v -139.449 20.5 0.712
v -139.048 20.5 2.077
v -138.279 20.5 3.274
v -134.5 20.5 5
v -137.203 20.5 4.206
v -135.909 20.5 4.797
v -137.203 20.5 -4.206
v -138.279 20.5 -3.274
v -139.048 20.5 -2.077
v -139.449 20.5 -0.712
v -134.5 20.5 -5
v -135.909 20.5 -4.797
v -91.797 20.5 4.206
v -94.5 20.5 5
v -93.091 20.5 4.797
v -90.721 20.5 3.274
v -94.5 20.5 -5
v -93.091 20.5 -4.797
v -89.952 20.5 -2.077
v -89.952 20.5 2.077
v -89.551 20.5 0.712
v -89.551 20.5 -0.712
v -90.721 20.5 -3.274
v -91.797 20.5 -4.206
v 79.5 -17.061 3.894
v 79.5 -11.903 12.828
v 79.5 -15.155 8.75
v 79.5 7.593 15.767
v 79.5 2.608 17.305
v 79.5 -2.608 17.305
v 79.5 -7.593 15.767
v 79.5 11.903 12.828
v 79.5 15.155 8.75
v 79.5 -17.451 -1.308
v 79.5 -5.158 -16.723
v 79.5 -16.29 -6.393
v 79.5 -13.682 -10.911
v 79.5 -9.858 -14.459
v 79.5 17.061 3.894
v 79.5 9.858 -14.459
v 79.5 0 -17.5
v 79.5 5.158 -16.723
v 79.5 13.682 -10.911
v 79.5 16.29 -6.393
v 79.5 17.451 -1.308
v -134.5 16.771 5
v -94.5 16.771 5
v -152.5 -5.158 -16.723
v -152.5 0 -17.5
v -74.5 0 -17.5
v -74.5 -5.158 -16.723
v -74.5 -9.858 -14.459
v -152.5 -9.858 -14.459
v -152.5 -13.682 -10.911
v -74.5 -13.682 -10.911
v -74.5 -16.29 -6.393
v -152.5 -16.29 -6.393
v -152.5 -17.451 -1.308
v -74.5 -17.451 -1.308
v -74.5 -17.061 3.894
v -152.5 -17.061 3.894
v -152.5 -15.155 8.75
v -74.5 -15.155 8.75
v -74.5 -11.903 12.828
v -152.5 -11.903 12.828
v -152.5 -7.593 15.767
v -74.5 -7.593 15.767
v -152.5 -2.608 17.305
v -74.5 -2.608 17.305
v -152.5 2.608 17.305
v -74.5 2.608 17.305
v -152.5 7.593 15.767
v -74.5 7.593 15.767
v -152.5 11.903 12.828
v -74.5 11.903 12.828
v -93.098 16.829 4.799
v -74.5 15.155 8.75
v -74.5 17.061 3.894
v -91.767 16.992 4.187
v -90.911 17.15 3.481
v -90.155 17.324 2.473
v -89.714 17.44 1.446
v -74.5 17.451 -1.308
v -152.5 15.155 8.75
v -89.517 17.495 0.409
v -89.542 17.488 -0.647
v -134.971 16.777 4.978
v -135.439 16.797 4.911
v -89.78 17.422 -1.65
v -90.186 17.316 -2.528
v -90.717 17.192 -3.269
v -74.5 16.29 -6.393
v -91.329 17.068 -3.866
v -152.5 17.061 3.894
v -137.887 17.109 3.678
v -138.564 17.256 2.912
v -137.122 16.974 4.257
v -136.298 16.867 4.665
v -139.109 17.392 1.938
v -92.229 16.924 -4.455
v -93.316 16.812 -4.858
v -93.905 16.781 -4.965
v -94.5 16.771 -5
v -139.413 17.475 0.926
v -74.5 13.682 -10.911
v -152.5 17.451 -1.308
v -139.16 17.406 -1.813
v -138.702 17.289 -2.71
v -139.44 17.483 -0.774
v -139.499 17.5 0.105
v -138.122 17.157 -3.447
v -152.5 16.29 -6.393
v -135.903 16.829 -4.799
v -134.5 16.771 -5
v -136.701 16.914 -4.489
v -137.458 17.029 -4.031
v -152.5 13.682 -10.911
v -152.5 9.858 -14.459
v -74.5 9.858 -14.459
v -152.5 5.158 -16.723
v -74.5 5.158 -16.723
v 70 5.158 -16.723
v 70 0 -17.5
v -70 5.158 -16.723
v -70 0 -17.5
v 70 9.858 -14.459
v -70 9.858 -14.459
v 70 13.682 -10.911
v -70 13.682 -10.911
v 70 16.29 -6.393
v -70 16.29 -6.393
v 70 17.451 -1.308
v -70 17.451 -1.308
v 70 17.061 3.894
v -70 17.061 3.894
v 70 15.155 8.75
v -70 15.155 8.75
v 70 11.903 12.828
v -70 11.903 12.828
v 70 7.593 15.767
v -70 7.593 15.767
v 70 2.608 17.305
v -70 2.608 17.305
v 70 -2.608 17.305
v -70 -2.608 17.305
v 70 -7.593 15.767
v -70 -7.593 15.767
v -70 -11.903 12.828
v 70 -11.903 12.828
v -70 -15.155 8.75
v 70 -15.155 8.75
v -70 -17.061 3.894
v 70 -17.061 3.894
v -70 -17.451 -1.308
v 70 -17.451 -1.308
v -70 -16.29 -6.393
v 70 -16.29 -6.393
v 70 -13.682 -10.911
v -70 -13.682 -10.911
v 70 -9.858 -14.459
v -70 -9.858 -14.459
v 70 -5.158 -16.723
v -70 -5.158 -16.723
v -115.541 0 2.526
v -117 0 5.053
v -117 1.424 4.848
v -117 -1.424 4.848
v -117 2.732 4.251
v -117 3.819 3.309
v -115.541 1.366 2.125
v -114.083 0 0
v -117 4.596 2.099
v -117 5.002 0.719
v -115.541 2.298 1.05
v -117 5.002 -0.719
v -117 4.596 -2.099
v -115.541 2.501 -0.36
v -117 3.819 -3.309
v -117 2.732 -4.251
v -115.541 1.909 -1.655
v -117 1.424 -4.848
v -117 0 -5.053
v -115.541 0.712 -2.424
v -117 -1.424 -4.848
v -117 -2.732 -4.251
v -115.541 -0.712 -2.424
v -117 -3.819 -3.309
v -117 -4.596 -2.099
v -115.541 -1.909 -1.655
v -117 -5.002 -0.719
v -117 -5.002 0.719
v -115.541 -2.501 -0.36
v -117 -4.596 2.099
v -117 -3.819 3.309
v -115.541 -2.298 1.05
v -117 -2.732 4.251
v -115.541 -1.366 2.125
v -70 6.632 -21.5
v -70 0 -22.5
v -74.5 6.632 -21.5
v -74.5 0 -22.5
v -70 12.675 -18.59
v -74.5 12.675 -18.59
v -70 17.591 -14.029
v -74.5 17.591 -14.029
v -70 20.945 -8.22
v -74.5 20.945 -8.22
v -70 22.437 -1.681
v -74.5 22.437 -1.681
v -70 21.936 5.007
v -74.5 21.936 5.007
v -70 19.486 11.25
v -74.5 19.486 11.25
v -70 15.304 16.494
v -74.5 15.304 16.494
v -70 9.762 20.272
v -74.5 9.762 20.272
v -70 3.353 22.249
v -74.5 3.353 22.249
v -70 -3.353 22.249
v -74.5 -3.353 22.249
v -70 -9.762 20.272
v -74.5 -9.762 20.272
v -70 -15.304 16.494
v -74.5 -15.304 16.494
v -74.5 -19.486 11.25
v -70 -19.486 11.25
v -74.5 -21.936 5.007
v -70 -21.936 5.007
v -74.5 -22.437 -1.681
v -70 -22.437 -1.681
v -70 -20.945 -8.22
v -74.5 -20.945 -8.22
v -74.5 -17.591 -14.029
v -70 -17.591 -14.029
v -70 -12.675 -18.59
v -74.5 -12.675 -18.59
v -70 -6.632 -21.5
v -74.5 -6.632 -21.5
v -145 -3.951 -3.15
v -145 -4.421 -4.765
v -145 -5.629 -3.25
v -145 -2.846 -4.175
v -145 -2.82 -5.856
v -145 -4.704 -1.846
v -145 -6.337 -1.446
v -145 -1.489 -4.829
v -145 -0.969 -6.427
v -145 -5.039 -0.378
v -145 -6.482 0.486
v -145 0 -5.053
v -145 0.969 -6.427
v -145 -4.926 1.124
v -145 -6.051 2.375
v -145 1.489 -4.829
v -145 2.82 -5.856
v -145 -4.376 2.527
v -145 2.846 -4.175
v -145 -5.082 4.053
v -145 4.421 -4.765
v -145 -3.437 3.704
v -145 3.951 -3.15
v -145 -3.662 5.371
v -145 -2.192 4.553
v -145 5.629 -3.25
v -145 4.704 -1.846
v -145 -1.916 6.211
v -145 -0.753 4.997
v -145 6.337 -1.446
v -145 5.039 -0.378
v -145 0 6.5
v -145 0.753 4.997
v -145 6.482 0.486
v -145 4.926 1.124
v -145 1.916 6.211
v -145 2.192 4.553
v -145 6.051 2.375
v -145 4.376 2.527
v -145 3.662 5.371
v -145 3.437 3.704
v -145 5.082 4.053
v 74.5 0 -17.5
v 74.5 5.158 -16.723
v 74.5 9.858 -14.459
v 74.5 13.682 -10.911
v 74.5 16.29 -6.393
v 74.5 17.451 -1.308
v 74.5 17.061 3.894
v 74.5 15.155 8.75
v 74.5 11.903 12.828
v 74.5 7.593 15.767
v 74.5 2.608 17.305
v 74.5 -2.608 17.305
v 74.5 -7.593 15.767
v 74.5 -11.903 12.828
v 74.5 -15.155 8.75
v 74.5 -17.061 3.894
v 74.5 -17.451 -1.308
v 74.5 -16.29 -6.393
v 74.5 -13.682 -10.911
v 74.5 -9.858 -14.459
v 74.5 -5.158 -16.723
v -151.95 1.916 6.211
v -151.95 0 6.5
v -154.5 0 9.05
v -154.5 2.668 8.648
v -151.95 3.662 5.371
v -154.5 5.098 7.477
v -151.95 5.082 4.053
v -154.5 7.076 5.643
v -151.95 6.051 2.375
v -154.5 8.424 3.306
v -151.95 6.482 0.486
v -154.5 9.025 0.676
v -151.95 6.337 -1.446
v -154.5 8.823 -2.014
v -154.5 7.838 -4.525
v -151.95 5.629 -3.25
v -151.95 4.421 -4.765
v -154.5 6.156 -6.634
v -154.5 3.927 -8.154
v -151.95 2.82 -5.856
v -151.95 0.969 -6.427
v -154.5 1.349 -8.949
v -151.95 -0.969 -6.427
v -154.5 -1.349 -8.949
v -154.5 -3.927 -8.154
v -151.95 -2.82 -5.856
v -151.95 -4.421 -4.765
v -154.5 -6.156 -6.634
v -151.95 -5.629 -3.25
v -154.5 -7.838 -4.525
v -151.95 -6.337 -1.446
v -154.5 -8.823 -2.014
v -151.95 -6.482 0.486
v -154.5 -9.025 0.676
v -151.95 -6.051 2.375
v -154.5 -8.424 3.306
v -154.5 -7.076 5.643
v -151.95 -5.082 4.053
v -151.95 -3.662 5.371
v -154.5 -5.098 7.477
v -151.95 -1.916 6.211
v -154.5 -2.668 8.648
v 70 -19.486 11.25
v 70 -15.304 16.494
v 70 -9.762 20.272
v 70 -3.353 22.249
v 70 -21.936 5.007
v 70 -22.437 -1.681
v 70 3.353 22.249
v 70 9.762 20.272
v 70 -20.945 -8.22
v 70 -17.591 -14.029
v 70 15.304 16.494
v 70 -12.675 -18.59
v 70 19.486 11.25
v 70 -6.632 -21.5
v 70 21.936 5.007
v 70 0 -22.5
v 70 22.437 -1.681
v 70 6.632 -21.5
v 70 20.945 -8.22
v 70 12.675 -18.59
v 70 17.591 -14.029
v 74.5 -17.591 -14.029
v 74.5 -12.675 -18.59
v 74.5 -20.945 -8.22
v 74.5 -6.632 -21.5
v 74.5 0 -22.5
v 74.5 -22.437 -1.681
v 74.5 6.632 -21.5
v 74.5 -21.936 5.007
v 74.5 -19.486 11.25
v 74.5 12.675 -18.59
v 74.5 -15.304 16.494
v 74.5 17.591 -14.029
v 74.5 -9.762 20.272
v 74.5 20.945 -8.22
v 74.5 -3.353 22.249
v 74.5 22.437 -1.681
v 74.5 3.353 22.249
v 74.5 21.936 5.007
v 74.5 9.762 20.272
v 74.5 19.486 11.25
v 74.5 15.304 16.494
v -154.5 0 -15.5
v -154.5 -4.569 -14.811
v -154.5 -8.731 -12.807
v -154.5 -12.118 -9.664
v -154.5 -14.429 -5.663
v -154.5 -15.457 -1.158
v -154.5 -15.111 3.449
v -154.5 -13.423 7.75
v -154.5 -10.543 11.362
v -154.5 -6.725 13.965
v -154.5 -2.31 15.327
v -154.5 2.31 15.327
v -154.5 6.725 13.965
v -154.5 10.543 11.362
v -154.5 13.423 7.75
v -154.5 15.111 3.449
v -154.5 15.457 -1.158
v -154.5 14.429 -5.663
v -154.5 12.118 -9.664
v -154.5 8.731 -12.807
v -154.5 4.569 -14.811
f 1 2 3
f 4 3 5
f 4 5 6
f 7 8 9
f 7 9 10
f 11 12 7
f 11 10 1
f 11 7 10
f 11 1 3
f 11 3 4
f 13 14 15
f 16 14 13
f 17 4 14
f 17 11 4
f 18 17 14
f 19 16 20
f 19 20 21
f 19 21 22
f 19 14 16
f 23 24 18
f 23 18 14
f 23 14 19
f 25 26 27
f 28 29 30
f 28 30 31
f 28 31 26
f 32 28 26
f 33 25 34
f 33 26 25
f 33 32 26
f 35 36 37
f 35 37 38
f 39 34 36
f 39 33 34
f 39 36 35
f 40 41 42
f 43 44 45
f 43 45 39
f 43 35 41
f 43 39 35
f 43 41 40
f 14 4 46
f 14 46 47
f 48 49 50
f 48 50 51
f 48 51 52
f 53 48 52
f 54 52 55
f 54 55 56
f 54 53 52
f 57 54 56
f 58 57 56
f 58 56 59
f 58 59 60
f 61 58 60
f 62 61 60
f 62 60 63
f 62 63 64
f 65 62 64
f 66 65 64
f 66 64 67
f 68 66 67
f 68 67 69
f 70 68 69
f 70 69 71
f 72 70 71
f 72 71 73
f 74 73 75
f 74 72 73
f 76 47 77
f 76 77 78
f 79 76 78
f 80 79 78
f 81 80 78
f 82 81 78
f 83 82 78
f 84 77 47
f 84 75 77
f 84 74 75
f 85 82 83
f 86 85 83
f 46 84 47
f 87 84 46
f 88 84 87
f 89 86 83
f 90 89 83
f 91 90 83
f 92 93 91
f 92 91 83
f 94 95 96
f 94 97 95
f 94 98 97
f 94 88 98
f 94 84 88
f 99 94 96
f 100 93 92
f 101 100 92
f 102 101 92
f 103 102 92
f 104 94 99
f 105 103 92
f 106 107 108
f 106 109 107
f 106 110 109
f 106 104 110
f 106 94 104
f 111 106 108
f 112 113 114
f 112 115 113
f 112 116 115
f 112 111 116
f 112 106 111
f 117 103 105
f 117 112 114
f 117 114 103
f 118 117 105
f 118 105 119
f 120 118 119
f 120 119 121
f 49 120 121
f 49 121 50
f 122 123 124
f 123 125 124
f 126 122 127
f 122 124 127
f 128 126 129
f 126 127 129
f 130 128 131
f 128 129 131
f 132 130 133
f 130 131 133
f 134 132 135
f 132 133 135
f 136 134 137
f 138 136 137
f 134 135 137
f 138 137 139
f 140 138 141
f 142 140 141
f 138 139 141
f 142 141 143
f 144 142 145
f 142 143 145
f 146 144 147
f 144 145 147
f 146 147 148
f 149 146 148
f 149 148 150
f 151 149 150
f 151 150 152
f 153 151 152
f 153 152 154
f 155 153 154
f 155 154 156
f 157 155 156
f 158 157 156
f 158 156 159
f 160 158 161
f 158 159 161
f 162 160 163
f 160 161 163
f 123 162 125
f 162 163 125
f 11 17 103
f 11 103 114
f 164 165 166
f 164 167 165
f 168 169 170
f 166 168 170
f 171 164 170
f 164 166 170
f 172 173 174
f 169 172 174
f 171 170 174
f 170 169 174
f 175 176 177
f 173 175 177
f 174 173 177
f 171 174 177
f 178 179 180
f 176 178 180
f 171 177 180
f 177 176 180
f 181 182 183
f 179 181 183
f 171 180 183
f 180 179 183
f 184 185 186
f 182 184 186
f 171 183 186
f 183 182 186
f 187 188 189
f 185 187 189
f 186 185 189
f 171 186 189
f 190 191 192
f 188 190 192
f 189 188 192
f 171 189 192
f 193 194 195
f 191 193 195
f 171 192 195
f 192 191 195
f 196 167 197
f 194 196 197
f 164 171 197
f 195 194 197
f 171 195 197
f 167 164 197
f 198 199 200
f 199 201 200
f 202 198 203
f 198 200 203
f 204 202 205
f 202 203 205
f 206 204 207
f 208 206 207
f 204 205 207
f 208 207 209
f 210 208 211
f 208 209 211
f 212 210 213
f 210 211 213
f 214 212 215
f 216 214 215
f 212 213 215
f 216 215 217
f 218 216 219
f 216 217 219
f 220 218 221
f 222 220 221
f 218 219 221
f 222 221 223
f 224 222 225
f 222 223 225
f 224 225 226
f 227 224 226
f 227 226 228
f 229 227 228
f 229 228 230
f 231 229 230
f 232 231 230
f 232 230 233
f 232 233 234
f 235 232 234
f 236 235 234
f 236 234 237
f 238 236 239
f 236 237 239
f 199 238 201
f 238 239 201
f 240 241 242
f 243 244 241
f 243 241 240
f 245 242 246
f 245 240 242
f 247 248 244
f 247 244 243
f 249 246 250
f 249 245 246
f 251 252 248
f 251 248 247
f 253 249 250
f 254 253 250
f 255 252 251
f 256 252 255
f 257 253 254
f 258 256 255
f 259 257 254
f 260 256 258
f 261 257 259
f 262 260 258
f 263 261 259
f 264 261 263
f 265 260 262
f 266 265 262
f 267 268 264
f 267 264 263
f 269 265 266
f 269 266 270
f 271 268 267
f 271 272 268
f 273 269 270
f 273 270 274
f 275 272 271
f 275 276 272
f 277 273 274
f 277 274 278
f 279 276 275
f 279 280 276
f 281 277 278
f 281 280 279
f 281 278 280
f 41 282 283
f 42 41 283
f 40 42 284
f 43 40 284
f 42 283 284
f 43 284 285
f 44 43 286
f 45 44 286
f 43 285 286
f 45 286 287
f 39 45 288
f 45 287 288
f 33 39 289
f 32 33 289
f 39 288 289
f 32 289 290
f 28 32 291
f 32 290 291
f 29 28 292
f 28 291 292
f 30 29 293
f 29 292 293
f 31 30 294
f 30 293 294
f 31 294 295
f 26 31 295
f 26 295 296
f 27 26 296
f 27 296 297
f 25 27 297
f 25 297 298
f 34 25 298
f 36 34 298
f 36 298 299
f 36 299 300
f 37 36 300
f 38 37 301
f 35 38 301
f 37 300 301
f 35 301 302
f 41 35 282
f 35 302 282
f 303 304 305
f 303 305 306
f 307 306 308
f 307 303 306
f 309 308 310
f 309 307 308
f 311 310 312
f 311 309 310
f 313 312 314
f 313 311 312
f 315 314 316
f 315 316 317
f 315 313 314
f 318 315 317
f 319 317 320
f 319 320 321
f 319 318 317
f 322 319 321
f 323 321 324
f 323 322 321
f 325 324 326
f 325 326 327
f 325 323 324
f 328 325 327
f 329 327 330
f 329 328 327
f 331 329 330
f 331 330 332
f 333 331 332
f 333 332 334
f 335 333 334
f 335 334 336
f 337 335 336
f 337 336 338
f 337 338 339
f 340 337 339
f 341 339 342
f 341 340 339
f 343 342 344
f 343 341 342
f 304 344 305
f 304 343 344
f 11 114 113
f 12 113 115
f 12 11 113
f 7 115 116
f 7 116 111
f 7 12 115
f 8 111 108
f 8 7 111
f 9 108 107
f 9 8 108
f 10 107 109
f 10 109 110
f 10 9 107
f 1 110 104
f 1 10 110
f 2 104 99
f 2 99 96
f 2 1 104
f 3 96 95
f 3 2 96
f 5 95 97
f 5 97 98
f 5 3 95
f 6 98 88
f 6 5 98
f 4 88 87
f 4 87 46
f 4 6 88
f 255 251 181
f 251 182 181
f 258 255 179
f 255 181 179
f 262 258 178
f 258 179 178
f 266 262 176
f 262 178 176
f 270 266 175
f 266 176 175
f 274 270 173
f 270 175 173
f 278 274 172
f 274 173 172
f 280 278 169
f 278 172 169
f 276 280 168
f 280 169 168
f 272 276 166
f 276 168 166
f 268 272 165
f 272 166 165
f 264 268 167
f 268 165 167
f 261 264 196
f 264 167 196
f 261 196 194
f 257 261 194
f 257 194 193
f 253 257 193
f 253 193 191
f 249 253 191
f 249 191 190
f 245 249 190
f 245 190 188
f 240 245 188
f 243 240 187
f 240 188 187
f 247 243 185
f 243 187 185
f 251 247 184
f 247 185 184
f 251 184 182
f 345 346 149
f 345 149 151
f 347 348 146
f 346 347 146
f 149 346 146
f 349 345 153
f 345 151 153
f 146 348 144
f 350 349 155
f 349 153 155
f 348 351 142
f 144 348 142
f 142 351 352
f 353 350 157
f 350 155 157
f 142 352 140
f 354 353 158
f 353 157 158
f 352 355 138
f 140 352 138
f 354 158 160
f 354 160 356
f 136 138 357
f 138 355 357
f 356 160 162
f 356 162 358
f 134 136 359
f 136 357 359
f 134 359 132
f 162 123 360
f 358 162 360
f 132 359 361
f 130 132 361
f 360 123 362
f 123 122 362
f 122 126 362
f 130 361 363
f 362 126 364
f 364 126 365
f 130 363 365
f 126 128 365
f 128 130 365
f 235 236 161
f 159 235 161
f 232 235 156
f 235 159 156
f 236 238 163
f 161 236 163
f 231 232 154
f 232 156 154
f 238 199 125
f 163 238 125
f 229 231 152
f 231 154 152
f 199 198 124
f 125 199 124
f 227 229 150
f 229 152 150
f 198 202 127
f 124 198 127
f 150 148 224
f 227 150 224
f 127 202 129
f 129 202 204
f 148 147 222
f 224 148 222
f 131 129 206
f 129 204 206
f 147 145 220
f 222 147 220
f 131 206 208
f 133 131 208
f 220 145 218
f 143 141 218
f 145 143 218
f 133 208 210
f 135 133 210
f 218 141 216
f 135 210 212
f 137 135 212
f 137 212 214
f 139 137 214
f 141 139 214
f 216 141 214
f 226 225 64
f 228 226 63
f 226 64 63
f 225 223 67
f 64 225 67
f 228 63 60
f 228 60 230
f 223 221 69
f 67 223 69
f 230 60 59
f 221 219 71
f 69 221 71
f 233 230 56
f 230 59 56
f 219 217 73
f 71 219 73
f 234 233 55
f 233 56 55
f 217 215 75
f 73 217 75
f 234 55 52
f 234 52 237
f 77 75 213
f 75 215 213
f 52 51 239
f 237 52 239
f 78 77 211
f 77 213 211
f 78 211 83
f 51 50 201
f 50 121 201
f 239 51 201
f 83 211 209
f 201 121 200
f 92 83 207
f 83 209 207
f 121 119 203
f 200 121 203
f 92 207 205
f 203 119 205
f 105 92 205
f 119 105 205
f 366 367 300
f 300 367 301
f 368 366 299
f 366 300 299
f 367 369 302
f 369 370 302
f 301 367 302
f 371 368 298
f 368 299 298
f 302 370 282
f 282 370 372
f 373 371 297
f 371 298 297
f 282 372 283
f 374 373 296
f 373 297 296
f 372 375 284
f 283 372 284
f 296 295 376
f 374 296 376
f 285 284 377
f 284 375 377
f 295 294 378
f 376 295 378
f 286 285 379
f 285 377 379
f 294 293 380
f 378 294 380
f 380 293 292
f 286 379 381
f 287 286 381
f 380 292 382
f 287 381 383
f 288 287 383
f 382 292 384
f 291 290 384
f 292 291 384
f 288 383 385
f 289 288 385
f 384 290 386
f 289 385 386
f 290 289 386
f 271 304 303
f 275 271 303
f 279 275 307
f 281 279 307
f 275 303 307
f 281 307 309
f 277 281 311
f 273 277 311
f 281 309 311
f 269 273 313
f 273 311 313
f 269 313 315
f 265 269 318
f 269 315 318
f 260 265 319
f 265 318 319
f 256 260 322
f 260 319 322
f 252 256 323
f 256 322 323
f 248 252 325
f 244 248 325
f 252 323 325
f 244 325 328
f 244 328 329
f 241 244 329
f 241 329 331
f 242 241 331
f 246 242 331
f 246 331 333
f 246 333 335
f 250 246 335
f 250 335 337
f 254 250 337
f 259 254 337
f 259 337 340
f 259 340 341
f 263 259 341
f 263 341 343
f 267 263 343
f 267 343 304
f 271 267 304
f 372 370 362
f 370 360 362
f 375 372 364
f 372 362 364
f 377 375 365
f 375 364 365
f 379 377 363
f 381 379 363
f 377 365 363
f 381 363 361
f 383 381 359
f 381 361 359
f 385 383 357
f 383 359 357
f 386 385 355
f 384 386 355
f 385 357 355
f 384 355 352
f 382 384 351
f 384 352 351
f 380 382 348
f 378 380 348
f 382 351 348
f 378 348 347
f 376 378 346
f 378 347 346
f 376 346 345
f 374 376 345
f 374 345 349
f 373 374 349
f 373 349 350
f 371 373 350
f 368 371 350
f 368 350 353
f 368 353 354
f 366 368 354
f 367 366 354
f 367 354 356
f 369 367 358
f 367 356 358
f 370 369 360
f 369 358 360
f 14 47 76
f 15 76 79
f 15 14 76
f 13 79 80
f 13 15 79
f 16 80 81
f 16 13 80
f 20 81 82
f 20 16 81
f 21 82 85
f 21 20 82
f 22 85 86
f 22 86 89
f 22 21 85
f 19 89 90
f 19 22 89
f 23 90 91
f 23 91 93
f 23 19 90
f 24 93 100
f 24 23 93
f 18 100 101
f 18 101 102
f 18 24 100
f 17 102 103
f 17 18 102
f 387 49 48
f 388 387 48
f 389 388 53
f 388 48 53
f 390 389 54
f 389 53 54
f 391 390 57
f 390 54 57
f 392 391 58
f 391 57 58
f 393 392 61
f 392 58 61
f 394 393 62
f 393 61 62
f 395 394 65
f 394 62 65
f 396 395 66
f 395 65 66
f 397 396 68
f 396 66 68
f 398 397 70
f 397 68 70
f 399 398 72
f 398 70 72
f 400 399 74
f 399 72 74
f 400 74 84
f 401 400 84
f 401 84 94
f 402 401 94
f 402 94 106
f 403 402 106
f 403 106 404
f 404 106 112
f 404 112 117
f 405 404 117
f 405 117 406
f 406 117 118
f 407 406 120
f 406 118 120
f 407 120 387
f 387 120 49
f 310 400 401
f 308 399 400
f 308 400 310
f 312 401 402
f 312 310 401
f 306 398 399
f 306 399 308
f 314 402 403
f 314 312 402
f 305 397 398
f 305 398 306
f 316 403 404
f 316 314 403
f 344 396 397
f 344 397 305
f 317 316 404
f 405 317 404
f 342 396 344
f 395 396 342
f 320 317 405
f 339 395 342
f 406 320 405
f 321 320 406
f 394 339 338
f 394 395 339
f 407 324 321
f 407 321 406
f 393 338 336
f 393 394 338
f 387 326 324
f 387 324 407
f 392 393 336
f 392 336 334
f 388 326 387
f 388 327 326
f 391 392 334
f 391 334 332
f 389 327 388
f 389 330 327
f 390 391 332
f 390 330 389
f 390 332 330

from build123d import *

# Parameters (mm, degrees)
BOSS_EXTRUDE1_START      = 80
SKETCH2_R                = 17.5
BOSS_EXTRUDE1_DEPTH      = 80
BOSS_EXTRUDE2_REACH      = 163.943
BOSS_EXTRUDE2_END_RADIUS = 17.5
SKETCH4_R                = 17.5
BOSS_EXTRUDE3_DEPTH      = 5
HOLE1_D                  = 10.106
HOLE1_DEPTH              = 37.5
HOLE1_CBORE_D            = 13
HOLE1_CBORE_DEPTH        = 9.5
HOLE1_TIP                = 2.91735091
CHAMFER1_SIZE            = 2.55
CHAMFER2_SIZE            = 2


with BuildPart() as part:
    # Sketch1 → Revolve1 (revolve)
    with BuildSketch(Plane.XY, mode=Mode.PRIVATE) as revolve1_sk:
        Polygon((-74.5, 22.5), (-74.5, 0), (74.5, 0), (74.5, 22.5), (70, 22.5), (70, 17.5), (-70, 17.5), (-70, 22.5), align=None)
    revolve(revolve1_sk.sketch.rotate(Axis((-74.5, 0, 0), (1, 0, 0)), 270), axis=Axis((-74.5, 0, 0), (1, 0, 0)))

    # Sketch2 → Boss-Extrude1 (add)
    with BuildSketch(Plane.ZY.offset(74.5).offset(BOSS_EXTRUDE1_START)):
        with Locations(Location((0, 0, 0), (0, 0, 180))):
            Circle(SKETCH2_R)
    extrude(amount=-BOSS_EXTRUDE1_DEPTH)

    # Boss-Extrude2: up to this cylinder (the profile starts outside it)
    boss_extrude2_end = Plane(origin=(-114.5, 0, 0), z_dir=(1, 0, 0)) * Cylinder(BOSS_EXTRUDE2_END_RADIUS, 363.886, mode=Mode.PRIVATE)
    # Sketch3 → Boss-Extrude2 (add, up to the surface)
    with BuildSketch(Plane(origin=(0, 20.5, 0), x_dir=(1, 0, 0), z_dir=(0, 1, 0)), mode=Mode.PRIVATE) as boss_extrude2_sk1:
        with BuildLine():
            Line((-134.5, -5), (-94.5, -5))
            ThreePointArc((-94.5, -5), (-89.5, 0), (-94.5, 5))
            Line((-94.5, 5), (-134.5, 5))
            ThreePointArc((-134.5, 5), (-139.5, 0), (-134.5, -5))
        make_face()
    boss_extrude2_tool1 = extrude(boss_extrude2_sk1.sketch, amount=-BOSS_EXTRUDE2_REACH, mode=Mode.PRIVATE) - boss_extrude2_end
    add(boss_extrude2_tool1.solids().sort_by_distance((-114.5, 20.5, 0))[0])

    # Sketch4 → Boss-Extrude3 (add)
    with BuildSketch(Plane(origin=(74.5, 0, 0), x_dir=(0, 0, -1), z_dir=(1, 0, 0))):
        Circle(SKETCH4_R)
    extrude(amount=BOSS_EXTRUDE3_DEPTH)

    # Hole1
    with Locations(Plane.ZY.offset(154.5)):
        with Locations((0, 0)):
            CounterBoreHole(HOLE1_D / 2, HOLE1_CBORE_D / 2, HOLE1_CBORE_DEPTH, depth=HOLE1_DEPTH)
            with Locations((0, 0, -(HOLE1_DEPTH + HOLE1_TIP / 2))):  # 120° drill point
                Cone(0, HOLE1_D / 2, HOLE1_TIP, mode=Mode.SUBTRACT)

    # Chamfer1
    chamfer1_edges = [part.edges().sort_by_distance(p)[0] for p in [
        (-154.5, 0, -6.5),
    ]]
    chamfer(chamfer1_edges, length=CHAMFER1_SIZE)

    # Chamfer2
    chamfer2_edges = [part.edges().sort_by_distance(p)[0] for p in [
        (-154.5, 0, 17.5),
    ]]
    chamfer(chamfer2_edges, length=CHAMFER2_SIZE)


solid = part.part
